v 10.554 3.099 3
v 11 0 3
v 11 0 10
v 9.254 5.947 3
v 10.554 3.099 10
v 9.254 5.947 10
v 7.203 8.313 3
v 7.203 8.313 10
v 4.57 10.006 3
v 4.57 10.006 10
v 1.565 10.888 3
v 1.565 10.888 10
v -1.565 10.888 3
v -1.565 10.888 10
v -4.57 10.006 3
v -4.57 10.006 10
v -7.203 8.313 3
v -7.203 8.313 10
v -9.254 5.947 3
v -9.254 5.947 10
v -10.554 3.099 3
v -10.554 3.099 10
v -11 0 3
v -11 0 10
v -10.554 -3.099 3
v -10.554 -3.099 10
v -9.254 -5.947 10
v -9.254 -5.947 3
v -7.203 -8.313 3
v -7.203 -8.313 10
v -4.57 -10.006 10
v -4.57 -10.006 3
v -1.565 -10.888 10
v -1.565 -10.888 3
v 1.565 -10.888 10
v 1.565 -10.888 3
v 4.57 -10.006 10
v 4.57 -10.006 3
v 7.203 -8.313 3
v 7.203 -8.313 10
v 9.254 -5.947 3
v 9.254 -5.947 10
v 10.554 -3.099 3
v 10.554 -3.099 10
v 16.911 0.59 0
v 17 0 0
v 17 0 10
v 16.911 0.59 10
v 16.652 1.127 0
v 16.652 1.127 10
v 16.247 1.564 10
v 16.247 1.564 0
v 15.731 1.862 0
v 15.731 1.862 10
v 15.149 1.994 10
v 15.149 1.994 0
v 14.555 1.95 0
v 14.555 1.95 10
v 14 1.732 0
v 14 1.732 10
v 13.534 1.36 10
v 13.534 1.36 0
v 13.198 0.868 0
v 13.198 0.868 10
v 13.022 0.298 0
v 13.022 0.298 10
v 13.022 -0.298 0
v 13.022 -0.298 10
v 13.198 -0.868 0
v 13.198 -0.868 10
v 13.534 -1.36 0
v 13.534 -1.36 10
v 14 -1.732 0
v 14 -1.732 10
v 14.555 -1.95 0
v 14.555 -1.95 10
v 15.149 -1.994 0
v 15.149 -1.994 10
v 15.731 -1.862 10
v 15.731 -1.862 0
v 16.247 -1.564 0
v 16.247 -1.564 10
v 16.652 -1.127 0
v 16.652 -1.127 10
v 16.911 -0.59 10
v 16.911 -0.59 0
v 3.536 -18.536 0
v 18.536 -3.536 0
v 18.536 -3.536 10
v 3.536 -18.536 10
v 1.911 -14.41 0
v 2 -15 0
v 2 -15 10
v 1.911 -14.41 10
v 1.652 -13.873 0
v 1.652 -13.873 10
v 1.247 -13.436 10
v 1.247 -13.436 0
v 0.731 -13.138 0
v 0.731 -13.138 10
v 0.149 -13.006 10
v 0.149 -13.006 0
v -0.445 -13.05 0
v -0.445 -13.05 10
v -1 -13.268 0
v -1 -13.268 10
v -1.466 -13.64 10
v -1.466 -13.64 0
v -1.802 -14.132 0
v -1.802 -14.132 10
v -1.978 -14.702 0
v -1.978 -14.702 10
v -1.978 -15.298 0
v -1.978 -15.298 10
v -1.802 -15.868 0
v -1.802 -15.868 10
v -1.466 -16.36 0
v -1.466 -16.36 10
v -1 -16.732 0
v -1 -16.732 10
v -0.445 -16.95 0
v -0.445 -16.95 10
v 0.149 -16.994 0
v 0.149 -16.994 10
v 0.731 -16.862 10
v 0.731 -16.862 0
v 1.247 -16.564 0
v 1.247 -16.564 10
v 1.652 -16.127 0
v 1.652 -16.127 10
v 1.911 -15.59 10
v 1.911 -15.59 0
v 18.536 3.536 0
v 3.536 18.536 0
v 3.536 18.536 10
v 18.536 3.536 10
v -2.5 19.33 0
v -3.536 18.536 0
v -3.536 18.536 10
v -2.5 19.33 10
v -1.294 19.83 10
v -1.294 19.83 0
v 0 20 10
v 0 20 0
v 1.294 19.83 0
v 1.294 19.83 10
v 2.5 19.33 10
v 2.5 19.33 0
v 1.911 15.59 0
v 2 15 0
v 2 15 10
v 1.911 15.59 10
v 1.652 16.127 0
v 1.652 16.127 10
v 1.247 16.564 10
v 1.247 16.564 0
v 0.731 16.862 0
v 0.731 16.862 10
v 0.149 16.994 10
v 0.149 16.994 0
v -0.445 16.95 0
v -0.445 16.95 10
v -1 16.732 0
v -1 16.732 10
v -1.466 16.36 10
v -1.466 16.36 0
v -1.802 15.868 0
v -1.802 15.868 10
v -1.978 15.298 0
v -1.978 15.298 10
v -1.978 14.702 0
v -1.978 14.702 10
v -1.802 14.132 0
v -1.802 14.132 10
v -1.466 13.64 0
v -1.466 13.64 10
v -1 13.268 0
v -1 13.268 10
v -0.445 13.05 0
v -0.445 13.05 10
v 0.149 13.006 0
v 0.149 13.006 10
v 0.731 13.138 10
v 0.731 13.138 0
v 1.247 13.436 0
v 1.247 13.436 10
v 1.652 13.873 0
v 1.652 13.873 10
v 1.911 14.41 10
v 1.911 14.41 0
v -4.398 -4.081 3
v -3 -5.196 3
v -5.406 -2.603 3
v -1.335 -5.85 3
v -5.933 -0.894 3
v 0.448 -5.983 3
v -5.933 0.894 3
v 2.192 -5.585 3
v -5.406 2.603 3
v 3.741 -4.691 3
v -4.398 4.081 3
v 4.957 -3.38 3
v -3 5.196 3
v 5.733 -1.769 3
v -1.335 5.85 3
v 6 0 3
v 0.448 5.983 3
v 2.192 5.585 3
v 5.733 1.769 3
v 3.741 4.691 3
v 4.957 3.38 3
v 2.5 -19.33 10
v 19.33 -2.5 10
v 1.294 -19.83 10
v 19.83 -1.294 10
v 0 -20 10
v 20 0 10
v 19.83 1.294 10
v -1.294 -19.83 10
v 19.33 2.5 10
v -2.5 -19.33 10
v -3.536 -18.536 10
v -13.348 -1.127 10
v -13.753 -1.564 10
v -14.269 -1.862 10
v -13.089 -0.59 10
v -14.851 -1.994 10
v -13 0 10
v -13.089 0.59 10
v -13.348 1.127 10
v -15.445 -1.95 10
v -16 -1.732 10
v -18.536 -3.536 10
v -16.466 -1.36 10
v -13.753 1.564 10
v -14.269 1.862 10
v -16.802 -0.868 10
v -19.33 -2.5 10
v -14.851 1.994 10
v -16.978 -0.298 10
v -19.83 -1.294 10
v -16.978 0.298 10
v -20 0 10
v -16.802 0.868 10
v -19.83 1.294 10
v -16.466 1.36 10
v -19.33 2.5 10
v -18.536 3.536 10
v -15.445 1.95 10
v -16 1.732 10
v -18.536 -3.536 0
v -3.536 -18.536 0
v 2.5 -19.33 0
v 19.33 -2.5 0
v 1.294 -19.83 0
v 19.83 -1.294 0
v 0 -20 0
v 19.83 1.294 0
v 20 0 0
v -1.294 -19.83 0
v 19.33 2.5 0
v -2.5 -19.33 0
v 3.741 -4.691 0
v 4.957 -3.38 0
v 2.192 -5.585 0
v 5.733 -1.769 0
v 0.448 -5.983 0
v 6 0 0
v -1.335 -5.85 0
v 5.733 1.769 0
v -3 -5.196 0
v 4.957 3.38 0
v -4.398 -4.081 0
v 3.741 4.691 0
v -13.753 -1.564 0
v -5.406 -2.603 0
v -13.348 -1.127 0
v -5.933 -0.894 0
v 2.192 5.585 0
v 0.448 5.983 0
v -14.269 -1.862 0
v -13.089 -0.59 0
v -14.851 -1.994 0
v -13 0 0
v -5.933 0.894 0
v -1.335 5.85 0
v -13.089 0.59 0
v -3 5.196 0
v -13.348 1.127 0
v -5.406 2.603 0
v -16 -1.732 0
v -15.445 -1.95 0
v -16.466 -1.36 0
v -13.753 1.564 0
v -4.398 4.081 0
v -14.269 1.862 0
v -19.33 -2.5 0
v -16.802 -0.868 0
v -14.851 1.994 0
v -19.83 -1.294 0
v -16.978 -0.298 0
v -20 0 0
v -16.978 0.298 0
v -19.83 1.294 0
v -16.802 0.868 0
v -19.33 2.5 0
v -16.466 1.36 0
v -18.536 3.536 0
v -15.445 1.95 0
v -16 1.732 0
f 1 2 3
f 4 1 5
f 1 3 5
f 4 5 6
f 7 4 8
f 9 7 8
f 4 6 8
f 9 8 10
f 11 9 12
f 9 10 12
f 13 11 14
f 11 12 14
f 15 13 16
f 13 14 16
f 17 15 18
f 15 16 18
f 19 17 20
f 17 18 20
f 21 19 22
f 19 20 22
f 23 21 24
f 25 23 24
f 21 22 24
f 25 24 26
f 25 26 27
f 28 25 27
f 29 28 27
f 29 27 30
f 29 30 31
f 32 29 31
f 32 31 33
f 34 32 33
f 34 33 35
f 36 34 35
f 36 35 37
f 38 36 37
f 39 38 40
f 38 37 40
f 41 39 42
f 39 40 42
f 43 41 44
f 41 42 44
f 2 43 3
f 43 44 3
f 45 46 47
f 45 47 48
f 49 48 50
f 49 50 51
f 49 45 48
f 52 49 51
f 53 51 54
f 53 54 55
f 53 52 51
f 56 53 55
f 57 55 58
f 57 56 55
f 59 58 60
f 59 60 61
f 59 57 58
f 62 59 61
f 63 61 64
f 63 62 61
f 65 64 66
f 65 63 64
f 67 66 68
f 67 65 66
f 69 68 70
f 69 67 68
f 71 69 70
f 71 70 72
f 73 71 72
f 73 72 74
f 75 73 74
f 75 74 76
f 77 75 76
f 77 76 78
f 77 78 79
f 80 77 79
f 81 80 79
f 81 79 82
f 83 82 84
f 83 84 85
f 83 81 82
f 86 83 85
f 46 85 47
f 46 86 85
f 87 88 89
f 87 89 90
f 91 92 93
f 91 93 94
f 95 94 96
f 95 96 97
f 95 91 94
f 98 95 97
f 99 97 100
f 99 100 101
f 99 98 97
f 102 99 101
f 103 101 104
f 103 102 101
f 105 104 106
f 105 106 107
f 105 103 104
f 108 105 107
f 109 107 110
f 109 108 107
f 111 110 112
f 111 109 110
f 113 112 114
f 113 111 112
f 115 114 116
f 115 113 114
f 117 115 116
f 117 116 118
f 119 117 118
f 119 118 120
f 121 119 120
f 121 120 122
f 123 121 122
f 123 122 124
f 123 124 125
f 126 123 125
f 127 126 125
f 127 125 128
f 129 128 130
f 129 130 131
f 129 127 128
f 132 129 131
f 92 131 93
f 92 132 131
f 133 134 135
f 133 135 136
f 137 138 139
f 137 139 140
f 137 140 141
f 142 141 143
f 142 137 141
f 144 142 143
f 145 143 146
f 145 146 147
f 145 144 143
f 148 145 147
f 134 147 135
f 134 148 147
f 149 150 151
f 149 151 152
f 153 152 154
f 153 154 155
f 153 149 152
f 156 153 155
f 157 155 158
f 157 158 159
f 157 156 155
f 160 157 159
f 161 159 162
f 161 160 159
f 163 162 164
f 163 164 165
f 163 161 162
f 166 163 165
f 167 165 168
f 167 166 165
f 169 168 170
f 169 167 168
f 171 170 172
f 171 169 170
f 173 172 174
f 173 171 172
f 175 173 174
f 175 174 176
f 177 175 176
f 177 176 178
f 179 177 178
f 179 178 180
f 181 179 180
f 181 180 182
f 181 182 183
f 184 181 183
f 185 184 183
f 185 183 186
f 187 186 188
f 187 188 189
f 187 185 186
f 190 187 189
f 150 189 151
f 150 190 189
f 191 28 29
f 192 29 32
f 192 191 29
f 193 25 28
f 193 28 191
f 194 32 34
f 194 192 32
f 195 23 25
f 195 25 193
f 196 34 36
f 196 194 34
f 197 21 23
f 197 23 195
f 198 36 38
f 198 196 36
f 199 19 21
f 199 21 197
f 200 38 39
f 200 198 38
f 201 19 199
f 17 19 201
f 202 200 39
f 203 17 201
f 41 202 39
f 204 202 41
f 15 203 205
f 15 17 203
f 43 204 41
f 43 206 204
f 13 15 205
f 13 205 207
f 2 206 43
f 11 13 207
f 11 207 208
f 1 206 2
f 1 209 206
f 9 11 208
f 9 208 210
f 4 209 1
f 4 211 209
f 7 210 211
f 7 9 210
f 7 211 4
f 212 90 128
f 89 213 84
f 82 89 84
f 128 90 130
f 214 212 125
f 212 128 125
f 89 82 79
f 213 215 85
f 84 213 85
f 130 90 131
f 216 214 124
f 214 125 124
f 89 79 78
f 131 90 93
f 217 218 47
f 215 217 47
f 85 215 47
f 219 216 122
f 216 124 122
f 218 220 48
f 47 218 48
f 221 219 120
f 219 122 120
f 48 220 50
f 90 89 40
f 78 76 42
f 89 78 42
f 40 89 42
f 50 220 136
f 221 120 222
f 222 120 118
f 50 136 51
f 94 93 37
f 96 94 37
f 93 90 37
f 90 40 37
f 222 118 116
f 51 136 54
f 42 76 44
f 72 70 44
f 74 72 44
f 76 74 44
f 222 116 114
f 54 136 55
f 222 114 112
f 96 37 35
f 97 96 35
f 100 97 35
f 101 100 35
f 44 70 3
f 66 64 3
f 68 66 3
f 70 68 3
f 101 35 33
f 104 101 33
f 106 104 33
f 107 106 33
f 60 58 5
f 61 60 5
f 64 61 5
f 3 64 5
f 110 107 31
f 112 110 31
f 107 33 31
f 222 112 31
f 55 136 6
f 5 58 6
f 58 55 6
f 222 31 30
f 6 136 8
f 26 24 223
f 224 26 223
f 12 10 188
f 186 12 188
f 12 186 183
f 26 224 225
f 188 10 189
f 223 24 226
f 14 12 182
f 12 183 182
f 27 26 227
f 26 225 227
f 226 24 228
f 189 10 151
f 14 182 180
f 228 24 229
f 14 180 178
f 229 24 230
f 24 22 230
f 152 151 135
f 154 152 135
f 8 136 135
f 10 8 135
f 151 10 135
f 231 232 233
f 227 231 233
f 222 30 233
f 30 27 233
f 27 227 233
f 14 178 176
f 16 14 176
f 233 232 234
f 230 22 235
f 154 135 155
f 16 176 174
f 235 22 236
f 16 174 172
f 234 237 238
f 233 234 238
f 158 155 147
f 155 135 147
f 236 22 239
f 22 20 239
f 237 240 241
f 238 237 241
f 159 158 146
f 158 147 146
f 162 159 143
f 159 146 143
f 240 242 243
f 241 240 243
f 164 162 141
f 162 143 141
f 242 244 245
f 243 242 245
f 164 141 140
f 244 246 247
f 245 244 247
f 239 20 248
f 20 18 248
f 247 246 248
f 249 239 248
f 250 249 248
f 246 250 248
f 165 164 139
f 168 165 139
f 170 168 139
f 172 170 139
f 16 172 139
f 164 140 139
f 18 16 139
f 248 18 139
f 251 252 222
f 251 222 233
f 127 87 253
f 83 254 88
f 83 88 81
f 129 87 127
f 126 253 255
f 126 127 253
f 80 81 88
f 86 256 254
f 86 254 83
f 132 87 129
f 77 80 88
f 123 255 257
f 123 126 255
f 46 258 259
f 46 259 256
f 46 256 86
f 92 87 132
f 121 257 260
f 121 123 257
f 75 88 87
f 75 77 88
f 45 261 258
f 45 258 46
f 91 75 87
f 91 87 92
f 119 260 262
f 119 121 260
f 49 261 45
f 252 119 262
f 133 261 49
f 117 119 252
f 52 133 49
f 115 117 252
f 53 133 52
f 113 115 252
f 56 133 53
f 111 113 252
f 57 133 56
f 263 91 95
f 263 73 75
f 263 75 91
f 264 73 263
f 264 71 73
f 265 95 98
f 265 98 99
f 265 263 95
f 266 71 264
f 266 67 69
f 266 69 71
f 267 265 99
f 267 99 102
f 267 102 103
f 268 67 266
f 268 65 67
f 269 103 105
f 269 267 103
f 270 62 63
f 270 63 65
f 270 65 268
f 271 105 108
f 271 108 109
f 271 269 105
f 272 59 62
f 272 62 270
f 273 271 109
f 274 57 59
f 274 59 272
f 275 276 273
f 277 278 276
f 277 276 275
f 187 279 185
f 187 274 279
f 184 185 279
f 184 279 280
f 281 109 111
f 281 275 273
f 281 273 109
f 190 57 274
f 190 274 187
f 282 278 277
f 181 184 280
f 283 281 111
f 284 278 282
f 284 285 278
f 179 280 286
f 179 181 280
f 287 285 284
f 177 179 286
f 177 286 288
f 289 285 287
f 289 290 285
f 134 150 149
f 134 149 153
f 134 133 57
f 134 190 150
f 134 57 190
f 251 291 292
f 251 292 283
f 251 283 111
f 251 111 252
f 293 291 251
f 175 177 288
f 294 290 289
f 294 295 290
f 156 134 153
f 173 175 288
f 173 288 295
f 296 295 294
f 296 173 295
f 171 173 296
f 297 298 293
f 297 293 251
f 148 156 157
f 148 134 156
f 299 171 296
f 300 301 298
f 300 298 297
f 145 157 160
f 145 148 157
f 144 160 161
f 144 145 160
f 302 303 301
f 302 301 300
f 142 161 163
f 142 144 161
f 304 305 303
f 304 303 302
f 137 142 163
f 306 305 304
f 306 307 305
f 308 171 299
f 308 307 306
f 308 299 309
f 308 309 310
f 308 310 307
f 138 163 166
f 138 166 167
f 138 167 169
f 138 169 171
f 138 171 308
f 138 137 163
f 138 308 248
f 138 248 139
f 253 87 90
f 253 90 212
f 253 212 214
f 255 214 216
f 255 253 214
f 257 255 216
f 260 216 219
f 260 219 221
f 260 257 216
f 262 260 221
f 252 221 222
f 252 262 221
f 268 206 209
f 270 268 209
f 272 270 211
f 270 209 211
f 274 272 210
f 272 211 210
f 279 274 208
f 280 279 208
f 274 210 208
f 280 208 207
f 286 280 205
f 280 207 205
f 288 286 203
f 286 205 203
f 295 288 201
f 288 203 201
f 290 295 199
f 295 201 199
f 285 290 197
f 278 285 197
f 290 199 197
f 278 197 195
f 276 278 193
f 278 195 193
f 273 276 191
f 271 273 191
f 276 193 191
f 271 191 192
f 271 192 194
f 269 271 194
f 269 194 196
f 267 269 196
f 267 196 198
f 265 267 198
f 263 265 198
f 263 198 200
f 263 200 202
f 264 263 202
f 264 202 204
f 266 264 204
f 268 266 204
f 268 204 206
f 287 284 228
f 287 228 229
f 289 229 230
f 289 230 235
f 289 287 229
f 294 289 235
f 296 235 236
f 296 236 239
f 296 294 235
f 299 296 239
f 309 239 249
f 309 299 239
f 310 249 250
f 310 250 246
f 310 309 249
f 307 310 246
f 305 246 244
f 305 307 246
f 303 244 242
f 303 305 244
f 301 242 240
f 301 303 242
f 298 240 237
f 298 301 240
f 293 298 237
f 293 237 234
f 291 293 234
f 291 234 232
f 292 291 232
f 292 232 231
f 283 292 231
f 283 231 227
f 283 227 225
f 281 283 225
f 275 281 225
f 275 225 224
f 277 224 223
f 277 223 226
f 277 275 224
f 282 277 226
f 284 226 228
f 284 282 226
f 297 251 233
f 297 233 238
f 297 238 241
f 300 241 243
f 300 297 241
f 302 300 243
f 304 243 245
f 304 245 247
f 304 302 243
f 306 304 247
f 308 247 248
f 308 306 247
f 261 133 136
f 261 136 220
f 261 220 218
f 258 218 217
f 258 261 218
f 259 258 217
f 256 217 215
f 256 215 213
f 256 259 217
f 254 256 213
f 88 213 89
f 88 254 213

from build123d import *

# Parameters (mm, degrees)
SKETCH1_R           = 2
BOSS_EXTRUDE1_DEPTH = 10
SKETCH2_R           = 11
CUT_EXTRUDE1_DEPTH  = 7
SKETCH3_R           = 6
CUT_EXTRUDE2_DEPTH  = 7


with BuildPart() as part:
    # Sketch1 → Boss-Extrude1 (new body)
    with BuildSketch(Plane.XY):
        with BuildLine():
            Line((-18.535533906, 3.535533906), (-3.535533906, 18.535533906))
            ThreePointArc((-3.535533906, 18.535533906), (0, 20), (3.535533906, 18.535533906))
            Line((3.535533906, 18.535533906), (18.535533906, 3.535533906))
            ThreePointArc((18.535533906, 3.535533906), (20, 0), (18.535533906, -3.535533906))
            Line((18.535533906, -3.535533906), (3.535533906, -18.535533906))
            ThreePointArc((3.535533906, -18.535533906), (0, -20), (-3.535533906, -18.535533906))
            Line((-3.535533906, -18.535533906), (-18.535533906, -3.535533906))
            ThreePointArc((-18.535533906, -3.535533906), (-20, 0), (-18.535533906, 3.535533906))
        make_face()
        with Locations((0, 15)):
            Circle(SKETCH1_R, mode=Mode.SUBTRACT)
        with Locations((15, 0)):
            Circle(SKETCH1_R, mode=Mode.SUBTRACT)
        with Locations((0, -15)):
            Circle(SKETCH1_R, mode=Mode.SUBTRACT)
        with Locations((-15, 0)):
            Circle(SKETCH1_R, mode=Mode.SUBTRACT)
    extrude(amount=BOSS_EXTRUDE1_DEPTH)

    # Sketch2 → Cut-Extrude1 (cut)
    with BuildSketch(Plane.XY.offset(10)):
        Circle(SKETCH2_R)
    extrude(amount=-CUT_EXTRUDE1_DEPTH, mode=Mode.SUBTRACT)

    # Sketch3 → Cut-Extrude2 (cut)
    with BuildSketch(Plane.XY.offset(3)):
        Circle(SKETCH3_R)
    extrude(amount=-CUT_EXTRUDE2_DEPTH, mode=Mode.SUBTRACT)


solid = part.part
